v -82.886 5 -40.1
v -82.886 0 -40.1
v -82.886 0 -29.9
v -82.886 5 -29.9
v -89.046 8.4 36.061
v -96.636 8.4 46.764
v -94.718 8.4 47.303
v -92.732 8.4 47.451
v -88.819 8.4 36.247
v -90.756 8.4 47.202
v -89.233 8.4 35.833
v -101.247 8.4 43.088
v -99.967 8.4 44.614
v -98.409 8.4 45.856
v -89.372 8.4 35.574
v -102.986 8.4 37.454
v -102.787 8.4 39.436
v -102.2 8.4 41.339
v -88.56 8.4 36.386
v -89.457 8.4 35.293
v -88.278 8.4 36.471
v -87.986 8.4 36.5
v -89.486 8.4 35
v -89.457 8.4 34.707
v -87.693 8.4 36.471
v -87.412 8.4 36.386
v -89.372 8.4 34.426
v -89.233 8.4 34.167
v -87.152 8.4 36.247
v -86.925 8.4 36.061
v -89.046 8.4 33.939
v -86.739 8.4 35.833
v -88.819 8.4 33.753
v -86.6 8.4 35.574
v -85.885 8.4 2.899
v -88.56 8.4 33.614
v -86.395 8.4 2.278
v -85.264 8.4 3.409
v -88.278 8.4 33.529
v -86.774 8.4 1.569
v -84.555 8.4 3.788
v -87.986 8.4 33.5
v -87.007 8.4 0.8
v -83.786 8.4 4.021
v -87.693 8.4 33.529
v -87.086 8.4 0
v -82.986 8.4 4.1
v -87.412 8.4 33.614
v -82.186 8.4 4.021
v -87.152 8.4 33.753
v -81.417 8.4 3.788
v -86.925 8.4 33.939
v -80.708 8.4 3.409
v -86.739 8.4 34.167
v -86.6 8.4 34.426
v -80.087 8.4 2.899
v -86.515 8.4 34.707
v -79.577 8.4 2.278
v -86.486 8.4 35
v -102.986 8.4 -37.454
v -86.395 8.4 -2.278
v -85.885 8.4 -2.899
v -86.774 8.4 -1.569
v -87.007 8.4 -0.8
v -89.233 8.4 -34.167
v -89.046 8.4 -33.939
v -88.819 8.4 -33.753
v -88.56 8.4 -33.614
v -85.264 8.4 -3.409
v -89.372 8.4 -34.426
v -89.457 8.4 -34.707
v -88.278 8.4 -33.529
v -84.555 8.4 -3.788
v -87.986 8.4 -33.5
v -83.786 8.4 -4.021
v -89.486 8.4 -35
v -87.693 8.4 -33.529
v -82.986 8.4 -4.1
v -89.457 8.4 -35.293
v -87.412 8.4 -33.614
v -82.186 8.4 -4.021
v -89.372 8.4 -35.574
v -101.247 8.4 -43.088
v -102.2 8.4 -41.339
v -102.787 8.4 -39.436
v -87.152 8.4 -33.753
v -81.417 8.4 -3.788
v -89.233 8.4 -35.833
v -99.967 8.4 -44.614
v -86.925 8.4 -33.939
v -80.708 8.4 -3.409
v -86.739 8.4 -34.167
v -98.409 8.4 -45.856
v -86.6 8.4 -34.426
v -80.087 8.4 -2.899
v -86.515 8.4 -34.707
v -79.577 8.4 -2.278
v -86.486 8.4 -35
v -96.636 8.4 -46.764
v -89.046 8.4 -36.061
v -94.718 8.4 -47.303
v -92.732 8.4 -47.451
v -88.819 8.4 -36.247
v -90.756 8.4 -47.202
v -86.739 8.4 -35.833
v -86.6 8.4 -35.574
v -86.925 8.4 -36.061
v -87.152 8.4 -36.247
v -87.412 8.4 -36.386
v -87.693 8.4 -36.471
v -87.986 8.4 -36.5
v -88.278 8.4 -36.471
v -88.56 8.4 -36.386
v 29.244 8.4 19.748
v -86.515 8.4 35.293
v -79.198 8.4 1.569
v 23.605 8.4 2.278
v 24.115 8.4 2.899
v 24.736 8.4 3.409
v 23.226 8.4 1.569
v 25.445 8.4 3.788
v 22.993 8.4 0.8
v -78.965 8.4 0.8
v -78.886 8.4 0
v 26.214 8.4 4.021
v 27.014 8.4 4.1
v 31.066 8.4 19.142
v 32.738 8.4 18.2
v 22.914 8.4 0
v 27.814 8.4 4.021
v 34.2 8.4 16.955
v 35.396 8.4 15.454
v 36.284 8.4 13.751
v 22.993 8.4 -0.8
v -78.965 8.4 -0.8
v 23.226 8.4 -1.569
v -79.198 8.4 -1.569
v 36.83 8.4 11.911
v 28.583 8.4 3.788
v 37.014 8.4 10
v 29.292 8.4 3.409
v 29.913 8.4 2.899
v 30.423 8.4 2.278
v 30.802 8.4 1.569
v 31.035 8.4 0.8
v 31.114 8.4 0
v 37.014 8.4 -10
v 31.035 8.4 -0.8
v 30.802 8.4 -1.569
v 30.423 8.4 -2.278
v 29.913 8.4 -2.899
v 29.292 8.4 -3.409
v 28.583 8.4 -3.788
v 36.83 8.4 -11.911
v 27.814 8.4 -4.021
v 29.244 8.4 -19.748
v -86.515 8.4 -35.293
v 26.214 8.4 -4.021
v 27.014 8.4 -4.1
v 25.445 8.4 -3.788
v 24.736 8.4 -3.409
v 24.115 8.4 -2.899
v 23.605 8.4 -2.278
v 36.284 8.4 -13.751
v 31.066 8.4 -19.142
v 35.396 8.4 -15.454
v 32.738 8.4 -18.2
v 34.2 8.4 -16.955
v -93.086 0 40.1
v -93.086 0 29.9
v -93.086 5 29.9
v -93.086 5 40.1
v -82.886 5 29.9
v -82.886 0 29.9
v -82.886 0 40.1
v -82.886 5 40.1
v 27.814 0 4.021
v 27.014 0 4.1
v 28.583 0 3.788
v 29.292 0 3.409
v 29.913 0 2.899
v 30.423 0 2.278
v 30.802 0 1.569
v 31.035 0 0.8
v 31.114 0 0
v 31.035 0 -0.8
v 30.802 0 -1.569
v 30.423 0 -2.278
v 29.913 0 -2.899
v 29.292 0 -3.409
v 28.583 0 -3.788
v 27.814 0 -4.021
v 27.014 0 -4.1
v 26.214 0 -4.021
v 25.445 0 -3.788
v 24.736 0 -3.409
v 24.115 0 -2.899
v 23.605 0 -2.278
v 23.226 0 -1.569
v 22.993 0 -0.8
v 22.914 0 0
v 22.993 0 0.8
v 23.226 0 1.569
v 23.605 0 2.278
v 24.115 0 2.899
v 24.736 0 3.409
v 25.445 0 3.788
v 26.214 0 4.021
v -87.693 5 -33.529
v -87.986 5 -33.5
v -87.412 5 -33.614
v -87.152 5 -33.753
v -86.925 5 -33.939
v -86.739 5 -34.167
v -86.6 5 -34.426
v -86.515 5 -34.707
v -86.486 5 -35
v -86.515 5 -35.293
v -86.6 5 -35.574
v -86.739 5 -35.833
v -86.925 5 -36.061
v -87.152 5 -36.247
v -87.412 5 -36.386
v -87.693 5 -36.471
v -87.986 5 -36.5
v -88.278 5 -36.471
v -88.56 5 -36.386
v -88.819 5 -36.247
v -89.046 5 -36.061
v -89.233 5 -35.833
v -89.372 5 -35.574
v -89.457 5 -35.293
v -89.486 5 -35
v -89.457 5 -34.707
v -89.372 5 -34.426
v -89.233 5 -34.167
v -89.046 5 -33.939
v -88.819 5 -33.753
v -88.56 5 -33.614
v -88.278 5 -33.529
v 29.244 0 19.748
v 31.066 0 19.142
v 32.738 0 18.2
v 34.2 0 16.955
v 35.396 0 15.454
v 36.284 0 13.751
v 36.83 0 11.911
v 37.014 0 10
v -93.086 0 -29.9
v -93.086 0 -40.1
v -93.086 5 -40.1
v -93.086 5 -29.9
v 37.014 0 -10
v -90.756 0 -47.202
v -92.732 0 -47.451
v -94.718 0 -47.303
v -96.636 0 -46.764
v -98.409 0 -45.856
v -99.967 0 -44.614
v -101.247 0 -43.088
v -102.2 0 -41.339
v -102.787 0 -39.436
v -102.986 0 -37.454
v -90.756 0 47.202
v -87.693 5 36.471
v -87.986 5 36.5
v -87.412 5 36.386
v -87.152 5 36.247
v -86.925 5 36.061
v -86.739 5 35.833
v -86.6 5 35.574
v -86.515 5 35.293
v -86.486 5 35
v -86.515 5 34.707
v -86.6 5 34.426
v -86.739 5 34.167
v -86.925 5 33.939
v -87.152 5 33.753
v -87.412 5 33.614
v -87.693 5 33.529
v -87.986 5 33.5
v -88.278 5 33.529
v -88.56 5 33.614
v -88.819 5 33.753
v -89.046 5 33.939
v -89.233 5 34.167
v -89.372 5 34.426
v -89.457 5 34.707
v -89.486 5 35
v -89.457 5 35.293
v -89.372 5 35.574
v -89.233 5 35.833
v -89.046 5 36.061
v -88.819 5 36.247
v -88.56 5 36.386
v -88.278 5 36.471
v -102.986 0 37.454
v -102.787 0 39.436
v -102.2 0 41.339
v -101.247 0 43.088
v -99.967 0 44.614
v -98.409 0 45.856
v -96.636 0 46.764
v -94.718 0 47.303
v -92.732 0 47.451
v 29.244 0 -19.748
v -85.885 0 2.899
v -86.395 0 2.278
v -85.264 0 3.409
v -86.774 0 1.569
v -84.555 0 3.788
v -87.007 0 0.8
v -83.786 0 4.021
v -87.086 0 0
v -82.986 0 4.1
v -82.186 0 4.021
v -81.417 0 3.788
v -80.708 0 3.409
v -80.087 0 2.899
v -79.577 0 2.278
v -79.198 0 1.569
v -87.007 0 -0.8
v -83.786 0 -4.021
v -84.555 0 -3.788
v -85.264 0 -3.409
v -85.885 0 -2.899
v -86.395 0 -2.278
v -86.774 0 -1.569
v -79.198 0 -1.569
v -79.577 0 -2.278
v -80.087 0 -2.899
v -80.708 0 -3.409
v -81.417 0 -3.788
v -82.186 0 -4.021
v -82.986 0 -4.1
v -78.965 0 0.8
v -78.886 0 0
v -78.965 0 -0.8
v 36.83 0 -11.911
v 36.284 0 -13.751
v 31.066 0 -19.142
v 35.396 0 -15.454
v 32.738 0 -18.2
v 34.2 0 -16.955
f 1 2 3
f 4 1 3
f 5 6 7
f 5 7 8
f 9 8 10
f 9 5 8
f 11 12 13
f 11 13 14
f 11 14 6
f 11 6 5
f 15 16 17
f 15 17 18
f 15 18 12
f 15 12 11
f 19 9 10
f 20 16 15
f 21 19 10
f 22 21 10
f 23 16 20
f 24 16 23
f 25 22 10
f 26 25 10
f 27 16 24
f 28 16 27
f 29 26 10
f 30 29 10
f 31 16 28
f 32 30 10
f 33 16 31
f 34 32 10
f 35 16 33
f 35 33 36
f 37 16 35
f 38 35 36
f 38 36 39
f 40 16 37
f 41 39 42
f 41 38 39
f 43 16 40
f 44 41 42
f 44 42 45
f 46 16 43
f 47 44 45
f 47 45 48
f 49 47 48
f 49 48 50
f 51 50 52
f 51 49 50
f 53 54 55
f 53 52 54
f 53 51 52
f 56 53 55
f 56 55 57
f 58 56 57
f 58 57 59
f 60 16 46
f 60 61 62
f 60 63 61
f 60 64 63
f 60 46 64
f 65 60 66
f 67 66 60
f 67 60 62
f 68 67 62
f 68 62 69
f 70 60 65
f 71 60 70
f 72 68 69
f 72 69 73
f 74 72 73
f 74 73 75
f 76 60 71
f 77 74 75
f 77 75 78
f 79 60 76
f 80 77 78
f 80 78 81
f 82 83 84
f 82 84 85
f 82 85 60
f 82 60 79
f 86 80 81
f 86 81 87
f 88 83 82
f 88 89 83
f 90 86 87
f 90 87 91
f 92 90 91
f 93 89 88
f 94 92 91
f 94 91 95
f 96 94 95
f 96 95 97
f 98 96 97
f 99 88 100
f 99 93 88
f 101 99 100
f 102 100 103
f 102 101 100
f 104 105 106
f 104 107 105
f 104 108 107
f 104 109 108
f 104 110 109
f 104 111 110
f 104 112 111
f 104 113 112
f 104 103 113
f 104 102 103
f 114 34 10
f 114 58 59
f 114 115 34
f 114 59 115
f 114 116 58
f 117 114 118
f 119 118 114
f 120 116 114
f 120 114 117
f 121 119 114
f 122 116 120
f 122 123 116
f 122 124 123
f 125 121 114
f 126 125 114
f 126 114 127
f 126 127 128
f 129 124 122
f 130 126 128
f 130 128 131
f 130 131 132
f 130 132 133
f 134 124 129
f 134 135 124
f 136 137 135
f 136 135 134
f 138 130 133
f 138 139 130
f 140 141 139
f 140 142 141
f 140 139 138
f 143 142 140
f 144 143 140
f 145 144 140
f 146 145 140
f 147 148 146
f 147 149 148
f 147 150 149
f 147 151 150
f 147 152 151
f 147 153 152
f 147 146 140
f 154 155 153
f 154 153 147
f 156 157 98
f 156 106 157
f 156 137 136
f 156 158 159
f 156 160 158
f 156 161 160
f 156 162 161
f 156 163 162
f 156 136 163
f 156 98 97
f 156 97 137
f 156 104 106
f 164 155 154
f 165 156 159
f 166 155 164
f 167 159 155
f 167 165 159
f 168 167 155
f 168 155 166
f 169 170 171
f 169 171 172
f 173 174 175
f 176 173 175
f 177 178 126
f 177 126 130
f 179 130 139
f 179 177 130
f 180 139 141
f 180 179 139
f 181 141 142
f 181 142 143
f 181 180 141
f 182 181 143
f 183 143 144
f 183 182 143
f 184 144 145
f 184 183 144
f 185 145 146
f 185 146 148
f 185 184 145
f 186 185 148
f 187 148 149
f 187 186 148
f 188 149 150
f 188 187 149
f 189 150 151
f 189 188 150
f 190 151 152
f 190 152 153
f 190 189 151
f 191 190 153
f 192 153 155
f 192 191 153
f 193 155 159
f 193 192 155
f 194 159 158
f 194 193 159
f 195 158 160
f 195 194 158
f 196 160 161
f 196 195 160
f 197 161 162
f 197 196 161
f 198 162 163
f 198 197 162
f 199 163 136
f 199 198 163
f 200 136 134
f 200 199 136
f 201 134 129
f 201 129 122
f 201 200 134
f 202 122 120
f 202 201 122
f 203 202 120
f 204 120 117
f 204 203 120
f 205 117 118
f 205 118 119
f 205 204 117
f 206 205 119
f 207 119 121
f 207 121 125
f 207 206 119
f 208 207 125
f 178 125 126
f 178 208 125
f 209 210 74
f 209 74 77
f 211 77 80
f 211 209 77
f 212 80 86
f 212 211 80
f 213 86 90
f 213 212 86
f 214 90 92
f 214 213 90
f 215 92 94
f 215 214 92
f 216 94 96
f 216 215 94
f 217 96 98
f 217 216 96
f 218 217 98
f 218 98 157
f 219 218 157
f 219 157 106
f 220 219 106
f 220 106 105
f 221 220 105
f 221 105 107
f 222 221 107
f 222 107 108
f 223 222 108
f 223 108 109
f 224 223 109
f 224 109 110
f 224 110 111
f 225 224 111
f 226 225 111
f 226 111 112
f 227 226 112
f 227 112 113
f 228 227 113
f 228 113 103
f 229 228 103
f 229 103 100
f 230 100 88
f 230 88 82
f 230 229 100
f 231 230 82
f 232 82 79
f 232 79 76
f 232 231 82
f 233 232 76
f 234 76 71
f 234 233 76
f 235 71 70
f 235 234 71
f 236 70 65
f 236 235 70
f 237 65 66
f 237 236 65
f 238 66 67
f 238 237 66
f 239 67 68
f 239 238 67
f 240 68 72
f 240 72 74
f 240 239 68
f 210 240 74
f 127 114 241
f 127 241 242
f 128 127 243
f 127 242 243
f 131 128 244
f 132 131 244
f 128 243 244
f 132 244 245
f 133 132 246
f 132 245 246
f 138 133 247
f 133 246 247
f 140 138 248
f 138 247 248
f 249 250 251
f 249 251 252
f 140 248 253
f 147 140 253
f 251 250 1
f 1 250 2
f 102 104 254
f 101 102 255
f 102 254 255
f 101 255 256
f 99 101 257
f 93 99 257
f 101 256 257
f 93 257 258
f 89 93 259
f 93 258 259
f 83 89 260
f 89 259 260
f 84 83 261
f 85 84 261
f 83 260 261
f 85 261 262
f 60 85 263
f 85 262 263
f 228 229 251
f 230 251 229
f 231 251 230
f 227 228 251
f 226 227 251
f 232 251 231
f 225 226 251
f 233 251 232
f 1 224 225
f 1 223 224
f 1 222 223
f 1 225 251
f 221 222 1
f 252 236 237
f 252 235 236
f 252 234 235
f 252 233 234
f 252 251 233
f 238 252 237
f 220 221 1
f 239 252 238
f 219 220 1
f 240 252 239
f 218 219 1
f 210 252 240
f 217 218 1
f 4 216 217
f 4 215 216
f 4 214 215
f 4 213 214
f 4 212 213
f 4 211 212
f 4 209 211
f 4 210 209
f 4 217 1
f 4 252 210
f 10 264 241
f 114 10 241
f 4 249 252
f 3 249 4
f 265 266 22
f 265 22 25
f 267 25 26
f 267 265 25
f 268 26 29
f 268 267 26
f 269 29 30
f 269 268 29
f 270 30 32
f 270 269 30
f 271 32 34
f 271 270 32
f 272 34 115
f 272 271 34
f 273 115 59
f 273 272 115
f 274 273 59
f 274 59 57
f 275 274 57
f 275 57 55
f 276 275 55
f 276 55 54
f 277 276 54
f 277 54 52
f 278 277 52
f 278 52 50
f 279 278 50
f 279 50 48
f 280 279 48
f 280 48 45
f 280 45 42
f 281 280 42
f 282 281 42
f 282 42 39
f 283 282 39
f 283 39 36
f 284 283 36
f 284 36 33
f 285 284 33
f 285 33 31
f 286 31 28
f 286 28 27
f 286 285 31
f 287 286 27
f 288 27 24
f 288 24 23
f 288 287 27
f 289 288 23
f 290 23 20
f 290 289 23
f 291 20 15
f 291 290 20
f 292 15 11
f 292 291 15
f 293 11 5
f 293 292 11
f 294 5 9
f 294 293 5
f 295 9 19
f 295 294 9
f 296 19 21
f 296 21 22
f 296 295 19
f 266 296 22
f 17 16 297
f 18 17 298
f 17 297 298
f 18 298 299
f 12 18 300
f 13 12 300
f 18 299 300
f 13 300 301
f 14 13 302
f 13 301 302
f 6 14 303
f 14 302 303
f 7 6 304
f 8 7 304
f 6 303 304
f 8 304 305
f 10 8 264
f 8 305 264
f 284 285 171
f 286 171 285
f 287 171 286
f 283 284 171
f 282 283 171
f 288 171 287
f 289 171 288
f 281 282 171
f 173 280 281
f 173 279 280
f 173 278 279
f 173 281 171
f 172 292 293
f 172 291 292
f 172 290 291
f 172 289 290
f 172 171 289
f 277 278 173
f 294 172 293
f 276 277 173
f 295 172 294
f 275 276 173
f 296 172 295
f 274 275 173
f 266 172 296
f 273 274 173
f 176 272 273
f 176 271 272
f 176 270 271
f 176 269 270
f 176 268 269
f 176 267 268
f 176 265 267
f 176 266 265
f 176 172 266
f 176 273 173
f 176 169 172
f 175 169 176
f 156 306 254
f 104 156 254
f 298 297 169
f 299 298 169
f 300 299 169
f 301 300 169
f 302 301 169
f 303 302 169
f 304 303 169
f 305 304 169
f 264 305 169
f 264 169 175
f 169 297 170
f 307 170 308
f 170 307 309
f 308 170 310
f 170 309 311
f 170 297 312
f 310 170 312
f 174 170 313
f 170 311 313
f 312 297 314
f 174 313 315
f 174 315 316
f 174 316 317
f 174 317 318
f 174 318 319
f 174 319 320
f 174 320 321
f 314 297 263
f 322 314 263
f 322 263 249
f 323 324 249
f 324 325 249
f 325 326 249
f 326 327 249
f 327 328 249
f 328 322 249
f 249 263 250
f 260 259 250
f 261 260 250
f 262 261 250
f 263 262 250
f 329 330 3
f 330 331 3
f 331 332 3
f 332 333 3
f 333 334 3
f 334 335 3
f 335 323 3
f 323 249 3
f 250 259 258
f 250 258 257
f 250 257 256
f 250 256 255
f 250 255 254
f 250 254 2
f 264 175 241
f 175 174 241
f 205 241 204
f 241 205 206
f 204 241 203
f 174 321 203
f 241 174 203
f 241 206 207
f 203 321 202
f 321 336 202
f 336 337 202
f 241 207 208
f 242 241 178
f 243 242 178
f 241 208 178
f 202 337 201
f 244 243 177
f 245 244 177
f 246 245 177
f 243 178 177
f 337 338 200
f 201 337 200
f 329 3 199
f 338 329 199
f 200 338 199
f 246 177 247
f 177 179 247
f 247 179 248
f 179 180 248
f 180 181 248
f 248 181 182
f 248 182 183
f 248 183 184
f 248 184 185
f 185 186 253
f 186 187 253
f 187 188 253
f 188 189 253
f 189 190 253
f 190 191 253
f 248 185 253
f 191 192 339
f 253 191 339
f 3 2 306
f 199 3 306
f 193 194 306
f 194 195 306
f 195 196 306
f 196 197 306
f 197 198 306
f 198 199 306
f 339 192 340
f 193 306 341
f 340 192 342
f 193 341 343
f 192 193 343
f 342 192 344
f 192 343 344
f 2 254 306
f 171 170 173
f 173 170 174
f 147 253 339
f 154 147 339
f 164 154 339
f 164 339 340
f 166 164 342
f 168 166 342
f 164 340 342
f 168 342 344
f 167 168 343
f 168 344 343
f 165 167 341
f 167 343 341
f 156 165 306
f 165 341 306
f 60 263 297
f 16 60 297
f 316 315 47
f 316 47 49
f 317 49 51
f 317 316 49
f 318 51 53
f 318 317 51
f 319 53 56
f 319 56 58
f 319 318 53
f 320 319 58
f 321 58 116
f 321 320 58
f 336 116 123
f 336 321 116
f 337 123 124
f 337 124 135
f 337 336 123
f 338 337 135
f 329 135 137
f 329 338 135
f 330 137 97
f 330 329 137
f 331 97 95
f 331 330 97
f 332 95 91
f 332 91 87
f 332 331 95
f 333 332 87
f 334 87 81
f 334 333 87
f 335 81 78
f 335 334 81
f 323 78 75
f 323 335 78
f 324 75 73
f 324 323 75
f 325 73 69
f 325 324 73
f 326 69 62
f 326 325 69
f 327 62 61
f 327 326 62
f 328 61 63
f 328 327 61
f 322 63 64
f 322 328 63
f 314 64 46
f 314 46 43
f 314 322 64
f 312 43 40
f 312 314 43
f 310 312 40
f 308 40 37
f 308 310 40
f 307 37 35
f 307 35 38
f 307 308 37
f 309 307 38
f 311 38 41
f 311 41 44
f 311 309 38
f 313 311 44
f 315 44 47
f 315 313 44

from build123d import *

# Parameters (mm, degrees)
SKETCH_1_R          = 4.1
SKETCH_1_R_2        = 1.5
EXTRUDE_1_DEPTH     = 8.4
SKETCH_2_W          = 10.2
SKETCH_2_H          = 10.2
CUT_EXTRUDE_1_DEPTH = 5


with BuildPart() as part:
    # ｽｹｯﾁ1 → ﾎﾞｽ - 押し出し1 (new body)
    with BuildSketch(Plane(origin=(0, 0, 0), x_dir=(1, 0, 0), z_dir=(0, 1, 0))):
        with BuildLine():
            Line((-90.755581693, -47.201953746), (29.244418307, -19.748139436))
            ThreePointArc((29.244418307, -19.748139436), (34.834131004, -16.232897902), (37.014221558, -10))
            Line((37.014221558, -10), (37.014221558, 10))
            ThreePointArc((37.014221558, 10), (34.834131004, 16.232897902), (29.244418307, 19.748139436))
            Line((29.244418307, 19.748139436), (-90.755581693, 47.201953746))
            ThreePointArc((-90.755581693, 47.201953746), (-99.218676344, 45.273723756), (-102.985778442, 37.45381431))
            Line((-102.985778442, 37.45381431), (-102.985778442, -37.45381431))
            ThreePointArc((-102.985778442, -37.45381431), (-99.218676344, -45.273723756), (-90.755581693, -47.201953746))
        make_face()
        with Locations(Location((-82.985778442, 0, 0), (0, 0, 270))):
            Circle(SKETCH_1_R, mode=Mode.SUBTRACT)
        with Locations(Location((27.014221558, 0, 0), (0, 0, 270))):
            Circle(SKETCH_1_R, mode=Mode.SUBTRACT)
        with Locations(Location((-87.985778442, 35, 0), (0, 0, 270))):
            Circle(SKETCH_1_R_2, mode=Mode.SUBTRACT)
        with Locations(Location((-87.985778442, -35, 0), (0, 0, 270))):
            Circle(SKETCH_1_R_2, mode=Mode.SUBTRACT)
    extrude(amount=EXTRUDE_1_DEPTH)

    # ｽｹｯﾁ2 → ｶｯﾄ - 押し出し1 (cut)
    with BuildSketch(Plane.XZ):
        with Locations((-87.985778442, 35)):
            Rectangle(SKETCH_2_W, SKETCH_2_H)
        with Locations((-87.985778442, -35)):
            Rectangle(SKETCH_2_W, SKETCH_2_H)
    extrude(amount=-CUT_EXTRUDE_1_DEPTH, mode=Mode.SUBTRACT)


solid = part.part
